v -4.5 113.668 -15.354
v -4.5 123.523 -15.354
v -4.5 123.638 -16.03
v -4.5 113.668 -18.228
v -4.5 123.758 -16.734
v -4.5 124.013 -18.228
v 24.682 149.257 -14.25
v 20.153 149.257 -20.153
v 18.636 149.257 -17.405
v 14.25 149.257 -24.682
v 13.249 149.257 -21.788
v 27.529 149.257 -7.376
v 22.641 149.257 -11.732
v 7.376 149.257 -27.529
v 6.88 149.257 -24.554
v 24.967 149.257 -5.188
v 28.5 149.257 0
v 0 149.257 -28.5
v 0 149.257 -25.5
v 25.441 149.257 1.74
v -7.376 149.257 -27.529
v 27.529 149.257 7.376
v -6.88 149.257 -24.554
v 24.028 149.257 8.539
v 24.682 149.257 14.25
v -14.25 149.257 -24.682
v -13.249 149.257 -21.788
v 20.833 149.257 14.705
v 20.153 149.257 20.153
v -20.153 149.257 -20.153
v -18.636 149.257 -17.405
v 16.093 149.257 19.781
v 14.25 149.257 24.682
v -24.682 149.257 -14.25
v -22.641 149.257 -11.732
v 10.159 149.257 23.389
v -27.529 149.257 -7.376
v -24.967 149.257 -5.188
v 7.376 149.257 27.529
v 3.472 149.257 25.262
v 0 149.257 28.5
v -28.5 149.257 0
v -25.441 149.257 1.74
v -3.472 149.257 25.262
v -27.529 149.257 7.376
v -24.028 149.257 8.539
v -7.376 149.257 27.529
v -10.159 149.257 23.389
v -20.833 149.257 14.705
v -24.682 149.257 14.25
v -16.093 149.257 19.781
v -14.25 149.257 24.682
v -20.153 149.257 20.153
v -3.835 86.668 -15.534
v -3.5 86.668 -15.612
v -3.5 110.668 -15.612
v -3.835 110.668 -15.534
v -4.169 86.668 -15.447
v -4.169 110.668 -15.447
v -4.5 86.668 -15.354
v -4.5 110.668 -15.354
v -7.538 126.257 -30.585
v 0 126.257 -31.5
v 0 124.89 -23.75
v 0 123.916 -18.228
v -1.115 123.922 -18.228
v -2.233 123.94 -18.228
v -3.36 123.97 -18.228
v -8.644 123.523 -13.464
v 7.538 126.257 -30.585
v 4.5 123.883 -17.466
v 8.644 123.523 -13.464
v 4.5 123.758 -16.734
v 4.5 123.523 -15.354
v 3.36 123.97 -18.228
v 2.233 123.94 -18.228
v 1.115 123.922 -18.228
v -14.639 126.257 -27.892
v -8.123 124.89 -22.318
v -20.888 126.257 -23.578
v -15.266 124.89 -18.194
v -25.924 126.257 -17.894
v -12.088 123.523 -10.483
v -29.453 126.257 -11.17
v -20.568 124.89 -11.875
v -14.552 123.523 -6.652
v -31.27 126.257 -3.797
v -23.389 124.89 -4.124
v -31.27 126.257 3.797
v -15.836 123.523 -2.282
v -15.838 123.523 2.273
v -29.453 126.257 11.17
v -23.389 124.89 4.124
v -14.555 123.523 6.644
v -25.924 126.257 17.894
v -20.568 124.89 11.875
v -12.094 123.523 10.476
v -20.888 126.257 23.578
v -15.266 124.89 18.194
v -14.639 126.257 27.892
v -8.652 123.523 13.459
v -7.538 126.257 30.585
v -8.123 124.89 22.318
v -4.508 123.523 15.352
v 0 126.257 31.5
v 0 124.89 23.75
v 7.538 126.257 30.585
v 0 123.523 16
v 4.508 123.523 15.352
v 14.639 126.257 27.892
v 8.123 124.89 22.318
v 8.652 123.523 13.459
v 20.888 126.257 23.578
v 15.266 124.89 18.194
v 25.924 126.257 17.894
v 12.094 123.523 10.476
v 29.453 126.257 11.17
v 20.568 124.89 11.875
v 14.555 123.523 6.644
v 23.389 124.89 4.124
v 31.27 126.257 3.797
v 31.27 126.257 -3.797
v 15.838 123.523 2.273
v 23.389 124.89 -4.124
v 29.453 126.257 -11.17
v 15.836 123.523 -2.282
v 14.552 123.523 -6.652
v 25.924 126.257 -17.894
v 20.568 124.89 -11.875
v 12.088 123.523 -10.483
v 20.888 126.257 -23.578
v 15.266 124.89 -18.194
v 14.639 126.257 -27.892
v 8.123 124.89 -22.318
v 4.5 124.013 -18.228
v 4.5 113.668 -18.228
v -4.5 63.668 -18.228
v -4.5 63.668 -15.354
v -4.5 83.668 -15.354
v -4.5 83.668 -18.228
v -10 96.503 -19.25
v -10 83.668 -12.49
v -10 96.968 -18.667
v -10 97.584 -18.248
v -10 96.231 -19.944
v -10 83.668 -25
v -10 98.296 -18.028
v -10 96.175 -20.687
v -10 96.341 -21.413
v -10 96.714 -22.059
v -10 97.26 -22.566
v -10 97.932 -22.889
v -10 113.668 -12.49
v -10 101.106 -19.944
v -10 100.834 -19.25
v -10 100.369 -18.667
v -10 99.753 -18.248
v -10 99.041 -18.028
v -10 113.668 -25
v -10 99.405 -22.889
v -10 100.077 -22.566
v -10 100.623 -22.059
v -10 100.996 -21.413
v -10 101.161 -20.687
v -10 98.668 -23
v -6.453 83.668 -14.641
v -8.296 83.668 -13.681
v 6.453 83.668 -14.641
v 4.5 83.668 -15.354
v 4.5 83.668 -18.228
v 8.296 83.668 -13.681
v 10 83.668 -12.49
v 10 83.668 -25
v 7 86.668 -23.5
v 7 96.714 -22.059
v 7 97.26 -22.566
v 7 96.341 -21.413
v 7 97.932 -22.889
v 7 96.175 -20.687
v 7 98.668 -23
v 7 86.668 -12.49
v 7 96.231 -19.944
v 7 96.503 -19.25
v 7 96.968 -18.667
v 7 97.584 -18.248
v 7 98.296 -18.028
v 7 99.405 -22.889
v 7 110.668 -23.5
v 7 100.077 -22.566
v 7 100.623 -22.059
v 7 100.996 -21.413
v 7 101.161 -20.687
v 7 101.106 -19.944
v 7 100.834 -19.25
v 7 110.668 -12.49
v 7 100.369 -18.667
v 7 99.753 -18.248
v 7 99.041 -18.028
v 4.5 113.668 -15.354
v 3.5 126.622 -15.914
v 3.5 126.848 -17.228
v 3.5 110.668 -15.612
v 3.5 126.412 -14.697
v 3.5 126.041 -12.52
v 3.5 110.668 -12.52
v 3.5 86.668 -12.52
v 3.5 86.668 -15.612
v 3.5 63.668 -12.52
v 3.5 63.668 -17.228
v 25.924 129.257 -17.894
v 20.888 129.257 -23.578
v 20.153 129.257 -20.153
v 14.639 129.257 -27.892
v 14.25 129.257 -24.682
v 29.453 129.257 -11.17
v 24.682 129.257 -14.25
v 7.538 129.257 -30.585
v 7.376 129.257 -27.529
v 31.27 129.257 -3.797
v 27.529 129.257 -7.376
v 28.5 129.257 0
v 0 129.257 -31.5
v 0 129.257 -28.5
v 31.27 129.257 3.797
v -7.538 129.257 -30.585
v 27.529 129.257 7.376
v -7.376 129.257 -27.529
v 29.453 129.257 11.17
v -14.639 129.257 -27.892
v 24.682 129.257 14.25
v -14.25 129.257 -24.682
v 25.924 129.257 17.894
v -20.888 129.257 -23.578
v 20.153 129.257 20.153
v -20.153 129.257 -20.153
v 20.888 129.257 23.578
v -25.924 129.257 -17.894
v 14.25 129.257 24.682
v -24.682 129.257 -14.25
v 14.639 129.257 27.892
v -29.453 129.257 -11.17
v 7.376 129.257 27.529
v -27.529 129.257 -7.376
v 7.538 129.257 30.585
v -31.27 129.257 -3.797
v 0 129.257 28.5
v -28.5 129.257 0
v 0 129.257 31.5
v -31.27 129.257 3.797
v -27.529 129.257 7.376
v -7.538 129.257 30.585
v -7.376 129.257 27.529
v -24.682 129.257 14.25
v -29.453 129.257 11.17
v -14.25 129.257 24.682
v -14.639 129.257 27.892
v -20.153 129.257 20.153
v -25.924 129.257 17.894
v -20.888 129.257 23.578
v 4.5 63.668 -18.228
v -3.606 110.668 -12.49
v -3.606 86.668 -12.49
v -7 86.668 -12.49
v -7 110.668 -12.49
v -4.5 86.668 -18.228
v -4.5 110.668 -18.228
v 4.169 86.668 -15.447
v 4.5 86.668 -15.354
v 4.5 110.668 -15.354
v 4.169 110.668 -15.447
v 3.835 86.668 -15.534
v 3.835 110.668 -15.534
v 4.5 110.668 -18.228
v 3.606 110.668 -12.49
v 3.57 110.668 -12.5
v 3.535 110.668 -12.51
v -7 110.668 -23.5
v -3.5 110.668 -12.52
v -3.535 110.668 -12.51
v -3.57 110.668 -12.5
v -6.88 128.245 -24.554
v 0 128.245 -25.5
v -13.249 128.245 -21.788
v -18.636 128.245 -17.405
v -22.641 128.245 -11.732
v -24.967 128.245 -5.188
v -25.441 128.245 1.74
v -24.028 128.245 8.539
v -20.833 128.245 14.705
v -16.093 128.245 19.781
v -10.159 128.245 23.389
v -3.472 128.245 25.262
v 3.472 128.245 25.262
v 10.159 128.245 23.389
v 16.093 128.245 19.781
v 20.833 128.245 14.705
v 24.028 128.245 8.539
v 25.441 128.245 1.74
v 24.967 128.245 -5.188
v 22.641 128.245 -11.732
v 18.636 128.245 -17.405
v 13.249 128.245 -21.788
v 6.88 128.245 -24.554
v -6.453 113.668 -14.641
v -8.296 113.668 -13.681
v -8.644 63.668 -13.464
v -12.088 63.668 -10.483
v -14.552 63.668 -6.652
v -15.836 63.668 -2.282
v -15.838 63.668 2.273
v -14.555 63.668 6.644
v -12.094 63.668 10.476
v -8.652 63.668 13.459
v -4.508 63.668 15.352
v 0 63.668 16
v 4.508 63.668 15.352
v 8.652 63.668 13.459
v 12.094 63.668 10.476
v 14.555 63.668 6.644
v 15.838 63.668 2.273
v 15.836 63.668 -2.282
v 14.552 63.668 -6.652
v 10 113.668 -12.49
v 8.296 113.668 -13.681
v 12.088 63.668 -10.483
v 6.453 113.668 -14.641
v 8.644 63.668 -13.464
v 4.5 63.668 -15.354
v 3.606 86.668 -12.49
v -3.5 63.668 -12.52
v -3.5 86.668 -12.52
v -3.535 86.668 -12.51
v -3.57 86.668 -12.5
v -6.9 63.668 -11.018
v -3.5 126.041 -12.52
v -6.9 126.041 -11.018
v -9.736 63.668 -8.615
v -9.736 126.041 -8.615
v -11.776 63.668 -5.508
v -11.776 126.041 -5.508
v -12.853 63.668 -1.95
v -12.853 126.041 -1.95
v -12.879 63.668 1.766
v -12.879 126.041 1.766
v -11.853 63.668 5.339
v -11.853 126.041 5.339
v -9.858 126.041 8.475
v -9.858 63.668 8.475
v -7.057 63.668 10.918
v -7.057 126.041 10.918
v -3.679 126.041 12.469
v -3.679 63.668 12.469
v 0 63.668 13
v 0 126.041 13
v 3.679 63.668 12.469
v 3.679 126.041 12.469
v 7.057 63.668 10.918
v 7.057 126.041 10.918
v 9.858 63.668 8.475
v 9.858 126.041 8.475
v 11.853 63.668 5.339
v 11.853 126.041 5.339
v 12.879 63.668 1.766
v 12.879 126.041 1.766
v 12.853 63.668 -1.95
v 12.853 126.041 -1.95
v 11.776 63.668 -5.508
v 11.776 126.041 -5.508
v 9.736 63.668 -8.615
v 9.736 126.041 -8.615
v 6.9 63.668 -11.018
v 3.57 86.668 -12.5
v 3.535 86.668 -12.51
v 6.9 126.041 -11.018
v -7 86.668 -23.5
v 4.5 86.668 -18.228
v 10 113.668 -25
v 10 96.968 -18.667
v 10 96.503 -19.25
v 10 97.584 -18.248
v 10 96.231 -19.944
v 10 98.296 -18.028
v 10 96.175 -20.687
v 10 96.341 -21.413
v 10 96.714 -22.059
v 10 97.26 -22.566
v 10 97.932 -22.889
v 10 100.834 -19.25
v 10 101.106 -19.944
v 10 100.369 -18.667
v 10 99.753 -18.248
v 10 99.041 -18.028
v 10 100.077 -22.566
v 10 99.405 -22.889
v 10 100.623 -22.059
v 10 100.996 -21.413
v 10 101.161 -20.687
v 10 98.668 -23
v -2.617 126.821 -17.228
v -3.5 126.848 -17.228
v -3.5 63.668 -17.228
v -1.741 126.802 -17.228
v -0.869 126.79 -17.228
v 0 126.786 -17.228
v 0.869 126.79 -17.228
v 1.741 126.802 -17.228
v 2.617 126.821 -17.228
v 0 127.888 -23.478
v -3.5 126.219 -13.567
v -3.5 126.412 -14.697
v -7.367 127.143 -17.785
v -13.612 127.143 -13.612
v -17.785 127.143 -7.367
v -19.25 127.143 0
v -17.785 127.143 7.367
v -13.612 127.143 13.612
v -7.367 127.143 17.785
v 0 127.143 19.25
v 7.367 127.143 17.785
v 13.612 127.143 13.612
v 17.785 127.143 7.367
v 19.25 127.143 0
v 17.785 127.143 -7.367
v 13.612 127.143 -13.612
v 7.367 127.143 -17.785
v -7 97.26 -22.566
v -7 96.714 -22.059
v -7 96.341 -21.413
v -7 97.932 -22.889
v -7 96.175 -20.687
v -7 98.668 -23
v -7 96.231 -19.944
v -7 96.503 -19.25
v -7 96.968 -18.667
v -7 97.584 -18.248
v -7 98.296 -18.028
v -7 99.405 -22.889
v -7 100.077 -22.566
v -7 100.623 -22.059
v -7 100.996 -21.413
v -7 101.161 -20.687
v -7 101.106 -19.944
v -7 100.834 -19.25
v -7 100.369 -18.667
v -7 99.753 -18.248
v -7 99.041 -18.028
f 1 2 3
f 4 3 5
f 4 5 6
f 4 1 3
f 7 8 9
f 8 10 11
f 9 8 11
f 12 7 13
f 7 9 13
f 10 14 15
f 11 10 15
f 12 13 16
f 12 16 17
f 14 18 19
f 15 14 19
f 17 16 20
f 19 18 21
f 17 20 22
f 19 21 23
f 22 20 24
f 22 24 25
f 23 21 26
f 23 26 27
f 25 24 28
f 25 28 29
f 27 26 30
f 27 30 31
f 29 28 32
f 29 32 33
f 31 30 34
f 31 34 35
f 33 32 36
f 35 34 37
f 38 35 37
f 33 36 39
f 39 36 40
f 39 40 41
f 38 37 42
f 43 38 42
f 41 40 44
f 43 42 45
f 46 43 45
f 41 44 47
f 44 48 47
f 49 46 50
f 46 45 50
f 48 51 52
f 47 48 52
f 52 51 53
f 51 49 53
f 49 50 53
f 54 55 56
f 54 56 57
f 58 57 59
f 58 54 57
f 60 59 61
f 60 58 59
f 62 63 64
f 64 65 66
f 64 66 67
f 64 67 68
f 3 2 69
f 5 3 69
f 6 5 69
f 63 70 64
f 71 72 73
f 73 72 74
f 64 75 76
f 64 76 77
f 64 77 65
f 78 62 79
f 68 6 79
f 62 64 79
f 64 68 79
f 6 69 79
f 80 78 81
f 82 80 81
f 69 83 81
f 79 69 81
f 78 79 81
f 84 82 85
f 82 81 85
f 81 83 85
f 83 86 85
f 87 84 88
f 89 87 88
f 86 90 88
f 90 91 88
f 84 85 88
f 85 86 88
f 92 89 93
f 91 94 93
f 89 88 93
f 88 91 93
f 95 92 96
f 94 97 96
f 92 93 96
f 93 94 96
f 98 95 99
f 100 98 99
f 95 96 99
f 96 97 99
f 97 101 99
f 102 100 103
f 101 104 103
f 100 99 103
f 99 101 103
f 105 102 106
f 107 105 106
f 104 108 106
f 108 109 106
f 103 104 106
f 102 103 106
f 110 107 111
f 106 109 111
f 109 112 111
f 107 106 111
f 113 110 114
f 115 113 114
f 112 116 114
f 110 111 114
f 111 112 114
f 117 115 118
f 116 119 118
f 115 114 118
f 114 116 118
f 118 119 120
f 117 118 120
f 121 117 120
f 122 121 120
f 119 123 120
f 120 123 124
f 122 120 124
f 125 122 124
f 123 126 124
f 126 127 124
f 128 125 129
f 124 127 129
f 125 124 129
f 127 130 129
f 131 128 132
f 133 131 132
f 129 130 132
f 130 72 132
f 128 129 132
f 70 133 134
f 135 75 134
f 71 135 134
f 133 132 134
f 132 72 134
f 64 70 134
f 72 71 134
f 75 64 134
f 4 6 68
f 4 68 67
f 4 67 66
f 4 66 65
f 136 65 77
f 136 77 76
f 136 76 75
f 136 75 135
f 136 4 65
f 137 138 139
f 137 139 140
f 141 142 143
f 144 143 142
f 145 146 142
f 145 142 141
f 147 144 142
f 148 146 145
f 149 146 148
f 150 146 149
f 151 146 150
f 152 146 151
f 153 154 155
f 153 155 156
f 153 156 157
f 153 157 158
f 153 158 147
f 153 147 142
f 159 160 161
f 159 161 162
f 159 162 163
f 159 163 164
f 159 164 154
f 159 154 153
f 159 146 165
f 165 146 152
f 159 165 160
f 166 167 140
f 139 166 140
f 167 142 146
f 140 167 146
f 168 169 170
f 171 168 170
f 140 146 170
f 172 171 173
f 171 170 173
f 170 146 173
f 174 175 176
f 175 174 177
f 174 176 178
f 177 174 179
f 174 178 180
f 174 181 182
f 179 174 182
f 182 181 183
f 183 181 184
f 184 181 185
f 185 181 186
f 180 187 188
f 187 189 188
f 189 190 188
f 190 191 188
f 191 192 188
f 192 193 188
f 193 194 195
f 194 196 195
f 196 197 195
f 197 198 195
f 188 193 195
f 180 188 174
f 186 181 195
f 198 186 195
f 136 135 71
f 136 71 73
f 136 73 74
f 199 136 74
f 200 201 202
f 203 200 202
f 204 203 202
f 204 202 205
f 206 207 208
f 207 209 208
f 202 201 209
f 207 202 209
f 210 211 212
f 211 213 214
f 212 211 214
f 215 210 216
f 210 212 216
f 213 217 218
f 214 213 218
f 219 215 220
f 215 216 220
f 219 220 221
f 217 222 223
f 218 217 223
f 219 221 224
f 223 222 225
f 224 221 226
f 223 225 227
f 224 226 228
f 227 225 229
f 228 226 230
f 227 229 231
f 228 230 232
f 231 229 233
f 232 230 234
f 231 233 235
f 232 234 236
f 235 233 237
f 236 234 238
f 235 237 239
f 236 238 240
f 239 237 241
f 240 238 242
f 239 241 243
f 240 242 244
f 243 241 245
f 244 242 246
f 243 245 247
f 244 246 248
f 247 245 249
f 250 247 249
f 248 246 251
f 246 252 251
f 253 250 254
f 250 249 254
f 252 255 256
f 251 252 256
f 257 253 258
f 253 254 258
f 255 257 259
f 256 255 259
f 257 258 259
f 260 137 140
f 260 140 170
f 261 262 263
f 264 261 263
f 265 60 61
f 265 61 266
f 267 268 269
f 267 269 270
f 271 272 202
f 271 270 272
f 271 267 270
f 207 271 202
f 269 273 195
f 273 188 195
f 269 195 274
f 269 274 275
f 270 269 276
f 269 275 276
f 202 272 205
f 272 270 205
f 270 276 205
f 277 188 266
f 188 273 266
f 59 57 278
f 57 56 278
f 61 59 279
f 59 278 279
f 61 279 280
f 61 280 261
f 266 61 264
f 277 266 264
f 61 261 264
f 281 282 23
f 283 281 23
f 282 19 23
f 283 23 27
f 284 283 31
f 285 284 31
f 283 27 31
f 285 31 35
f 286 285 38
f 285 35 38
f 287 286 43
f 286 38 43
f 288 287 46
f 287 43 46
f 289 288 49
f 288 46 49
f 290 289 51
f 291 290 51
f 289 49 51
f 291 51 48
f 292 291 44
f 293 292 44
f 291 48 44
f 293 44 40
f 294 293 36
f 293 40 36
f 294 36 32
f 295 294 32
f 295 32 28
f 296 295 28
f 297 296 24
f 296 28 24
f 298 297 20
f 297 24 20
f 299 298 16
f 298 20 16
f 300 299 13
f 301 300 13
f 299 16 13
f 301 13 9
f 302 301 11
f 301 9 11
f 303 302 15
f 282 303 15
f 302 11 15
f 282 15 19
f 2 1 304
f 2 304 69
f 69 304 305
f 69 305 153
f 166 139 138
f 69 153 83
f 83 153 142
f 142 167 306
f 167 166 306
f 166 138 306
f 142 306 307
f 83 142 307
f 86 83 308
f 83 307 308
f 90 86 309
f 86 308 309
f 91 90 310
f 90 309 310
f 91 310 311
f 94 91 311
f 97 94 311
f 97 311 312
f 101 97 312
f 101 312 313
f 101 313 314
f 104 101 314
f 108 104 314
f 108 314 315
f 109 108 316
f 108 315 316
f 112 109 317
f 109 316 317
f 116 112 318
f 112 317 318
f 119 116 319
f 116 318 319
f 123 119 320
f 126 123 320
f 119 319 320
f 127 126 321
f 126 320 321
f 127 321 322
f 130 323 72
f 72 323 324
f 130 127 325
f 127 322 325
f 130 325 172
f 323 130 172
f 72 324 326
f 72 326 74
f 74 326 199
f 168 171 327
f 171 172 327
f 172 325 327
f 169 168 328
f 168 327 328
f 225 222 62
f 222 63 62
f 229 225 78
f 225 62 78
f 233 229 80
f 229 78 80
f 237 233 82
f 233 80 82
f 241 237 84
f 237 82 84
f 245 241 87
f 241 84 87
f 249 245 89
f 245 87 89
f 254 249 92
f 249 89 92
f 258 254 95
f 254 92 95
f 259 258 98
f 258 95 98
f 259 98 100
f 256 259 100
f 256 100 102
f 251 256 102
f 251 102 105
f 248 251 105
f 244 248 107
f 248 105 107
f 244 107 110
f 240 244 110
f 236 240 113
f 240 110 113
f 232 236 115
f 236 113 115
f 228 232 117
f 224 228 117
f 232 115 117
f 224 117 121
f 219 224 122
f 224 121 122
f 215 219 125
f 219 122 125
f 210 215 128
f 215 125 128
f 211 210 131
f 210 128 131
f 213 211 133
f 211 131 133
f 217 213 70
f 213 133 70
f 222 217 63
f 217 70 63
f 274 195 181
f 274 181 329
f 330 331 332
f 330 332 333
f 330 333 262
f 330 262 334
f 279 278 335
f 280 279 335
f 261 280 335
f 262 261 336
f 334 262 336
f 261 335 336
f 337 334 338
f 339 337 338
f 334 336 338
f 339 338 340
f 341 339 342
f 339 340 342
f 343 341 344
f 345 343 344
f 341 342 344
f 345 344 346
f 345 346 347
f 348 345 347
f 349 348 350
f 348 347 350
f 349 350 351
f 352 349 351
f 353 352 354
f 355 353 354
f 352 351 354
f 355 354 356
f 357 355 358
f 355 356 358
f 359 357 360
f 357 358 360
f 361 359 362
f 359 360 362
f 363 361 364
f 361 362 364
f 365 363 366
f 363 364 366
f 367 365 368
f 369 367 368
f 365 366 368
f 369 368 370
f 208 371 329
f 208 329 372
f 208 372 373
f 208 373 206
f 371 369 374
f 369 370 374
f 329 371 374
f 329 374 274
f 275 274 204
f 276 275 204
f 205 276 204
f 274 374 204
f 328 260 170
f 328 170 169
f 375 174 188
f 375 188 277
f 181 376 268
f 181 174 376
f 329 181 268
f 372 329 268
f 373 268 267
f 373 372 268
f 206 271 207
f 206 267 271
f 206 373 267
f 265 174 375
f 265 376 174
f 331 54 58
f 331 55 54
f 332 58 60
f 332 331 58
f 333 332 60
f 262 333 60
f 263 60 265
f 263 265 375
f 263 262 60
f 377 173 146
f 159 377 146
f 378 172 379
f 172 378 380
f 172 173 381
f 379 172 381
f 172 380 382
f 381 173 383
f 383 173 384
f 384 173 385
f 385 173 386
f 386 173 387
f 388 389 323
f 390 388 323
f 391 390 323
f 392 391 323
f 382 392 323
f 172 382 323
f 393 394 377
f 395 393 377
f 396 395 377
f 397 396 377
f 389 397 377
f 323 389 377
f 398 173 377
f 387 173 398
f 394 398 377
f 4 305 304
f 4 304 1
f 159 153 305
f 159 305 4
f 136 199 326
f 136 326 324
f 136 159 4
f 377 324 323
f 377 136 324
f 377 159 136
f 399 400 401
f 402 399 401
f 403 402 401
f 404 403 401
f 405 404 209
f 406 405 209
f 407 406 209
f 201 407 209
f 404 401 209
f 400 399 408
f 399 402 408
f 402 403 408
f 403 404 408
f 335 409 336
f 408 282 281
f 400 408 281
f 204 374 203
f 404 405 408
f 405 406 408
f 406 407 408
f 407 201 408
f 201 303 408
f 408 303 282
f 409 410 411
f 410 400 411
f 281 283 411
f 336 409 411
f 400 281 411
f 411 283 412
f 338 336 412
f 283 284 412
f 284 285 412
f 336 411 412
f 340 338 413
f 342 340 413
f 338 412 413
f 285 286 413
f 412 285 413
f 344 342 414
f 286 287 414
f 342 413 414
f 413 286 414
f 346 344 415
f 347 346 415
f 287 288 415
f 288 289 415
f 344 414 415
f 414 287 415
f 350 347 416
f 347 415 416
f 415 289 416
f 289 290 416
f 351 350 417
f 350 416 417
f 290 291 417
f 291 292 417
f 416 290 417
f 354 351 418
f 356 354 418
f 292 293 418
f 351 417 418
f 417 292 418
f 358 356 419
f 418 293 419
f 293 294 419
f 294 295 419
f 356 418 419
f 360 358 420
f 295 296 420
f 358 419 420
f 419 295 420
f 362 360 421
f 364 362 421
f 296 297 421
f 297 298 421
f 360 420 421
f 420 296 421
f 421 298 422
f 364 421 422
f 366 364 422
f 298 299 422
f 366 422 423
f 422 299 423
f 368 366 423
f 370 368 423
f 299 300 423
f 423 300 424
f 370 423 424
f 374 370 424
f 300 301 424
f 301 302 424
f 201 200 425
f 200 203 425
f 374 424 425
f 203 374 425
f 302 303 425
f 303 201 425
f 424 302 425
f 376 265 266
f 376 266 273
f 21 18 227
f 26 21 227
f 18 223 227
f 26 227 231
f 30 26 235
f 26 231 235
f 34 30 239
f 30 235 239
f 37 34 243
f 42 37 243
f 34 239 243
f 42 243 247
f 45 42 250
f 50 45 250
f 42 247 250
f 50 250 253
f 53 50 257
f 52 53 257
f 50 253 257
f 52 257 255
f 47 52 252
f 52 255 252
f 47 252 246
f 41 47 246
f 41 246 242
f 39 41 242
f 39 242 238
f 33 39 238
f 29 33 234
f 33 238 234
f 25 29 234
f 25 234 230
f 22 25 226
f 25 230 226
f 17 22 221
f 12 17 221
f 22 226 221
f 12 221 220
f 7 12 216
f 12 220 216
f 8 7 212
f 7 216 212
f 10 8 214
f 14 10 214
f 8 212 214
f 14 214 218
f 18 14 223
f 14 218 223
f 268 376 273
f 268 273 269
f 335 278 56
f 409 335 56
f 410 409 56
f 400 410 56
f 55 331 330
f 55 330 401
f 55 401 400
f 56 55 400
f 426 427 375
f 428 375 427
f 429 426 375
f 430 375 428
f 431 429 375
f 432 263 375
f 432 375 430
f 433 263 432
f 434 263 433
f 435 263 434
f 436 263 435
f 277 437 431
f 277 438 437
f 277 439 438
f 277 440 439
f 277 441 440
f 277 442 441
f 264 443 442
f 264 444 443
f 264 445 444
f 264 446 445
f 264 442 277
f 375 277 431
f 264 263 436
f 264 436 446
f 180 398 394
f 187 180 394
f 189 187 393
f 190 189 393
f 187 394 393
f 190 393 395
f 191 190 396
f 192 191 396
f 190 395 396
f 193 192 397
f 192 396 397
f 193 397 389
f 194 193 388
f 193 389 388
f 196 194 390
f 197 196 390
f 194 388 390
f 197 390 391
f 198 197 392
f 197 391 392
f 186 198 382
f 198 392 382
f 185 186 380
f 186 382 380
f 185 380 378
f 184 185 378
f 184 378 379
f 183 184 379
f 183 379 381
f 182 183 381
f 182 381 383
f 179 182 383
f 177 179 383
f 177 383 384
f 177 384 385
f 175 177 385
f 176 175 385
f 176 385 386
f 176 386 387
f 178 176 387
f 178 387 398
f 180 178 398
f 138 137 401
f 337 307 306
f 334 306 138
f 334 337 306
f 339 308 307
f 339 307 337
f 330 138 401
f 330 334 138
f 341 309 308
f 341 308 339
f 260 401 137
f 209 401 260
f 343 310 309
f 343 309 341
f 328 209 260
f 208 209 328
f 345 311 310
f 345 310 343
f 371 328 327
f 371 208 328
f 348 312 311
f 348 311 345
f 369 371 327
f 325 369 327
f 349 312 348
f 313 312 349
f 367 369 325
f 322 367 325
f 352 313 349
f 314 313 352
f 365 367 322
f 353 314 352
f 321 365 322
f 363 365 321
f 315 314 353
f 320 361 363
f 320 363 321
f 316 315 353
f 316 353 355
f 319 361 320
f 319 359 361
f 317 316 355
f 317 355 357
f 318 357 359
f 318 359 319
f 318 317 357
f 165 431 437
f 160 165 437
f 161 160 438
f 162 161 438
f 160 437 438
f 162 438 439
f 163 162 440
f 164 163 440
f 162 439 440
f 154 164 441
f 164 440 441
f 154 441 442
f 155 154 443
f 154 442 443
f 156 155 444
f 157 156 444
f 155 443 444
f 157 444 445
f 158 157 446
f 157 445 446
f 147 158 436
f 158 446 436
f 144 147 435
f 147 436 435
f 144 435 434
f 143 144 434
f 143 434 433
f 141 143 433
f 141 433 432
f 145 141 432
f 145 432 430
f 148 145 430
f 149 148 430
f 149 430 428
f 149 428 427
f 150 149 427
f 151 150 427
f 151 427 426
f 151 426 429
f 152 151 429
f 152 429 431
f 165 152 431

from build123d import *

# Parameters (mm, degrees)
CROQUIS2_W              = 20
CROQUIS2_H              = 9
SALIENTE_EXTRUIR1_DEPTH = 30
CROQUIS3_R              = 2.5
CORTAR_EXTRUIR1_DEPTH   = 30
SALIENTE_EXTRUIR2_REACH = 161.769
CROQUIS4_W              = 20
CROQUIS4_H              = 30
CROQUIS5_W              = 14
CROQUIS5_H              = 24
CORTAR_EXTRUIR2_DEPTH   = 11.010004003
SALIENTE_EXTRUIR3_REACH = 98.487
CORTAR_EXTRUIR3_REACH   = 98.487


with BuildPart() as part:
    # Croquis1 → Revolución1 (revolve)
    with BuildSketch(Plane(origin=(0, 0, 0), x_dir=(0, 0, -1), z_dir=(1, 0, 0))):
        Polygon((28.5, 149.256566287), (28.5, 129.256566287), (31.5, 129.256566287), (31.5, 126.256566287), (16, 123.523498086), (16, 63.6684817), (13, 63.6684817), (13, 126.040796979), (25.5, 128.244884238), (25.5, 149.256566287), align=None)
    revolve(axis=Axis((0, 0, 0), (0, 1, 0)))

    # Croquis4 → Saliente-Extruir2 (add, up to next)
    with BuildSketch(Plane.XY.offset(-16), mode=Mode.PRIVATE) as saliente_extruir2_sk1:
        with Locations((0, 98.6684817)):
            Rectangle(CROQUIS4_W, CROQUIS4_H)
    saliente_extruir2_tool1 = extrude(saliente_extruir2_sk1.sketch, amount=SALIENTE_EXTRUIR2_REACH, mode=Mode.PRIVATE) - part.part


with BuildPart() as body_2:
    # Croquis2 → Saliente-Extruir1 (new body)
    with BuildSketch(Plane(origin=(0, 83.6684817, 0), x_dir=(-1, 0, 0), z_dir=(0, -1, 0))):
        with Locations((0, 20.5)):
            Rectangle(CROQUIS2_W, CROQUIS2_H)
    extrude(amount=-SALIENTE_EXTRUIR1_DEPTH)

    # Croquis3 → Cortar-Extruir1 (cut)
    with BuildSketch(Plane(origin=(10, 0, 0), x_dir=(0, 0, -1), z_dir=(1, 0, 0))):
        with Locations((20.5, 98.6684817)):
            Circle(CROQUIS3_R)
    extrude(amount=-CORTAR_EXTRUIR1_DEPTH, mode=Mode.SUBTRACT)


with BuildPart() as part_1:
    add(part.part)

    add(body_2.part)  # Saliente-Extruir2 merges body 2
    add(saliente_extruir2_tool1.solids().sort_by_distance((0, 98.668482, -16))[0])
    add(saliente_extruir2_tool1.solids().sort_by_distance((0, 98.668482, -16))[1])

    # Croquis5 → Cortar-Extruir2 (cut)
    with BuildSketch(Plane(origin=(0, 0, -12.489995997), x_dir=(-1, 0, 0), z_dir=(0, 0, -1))):
        with Locations((0, 98.6684817)):
            Rectangle(CROQUIS5_W, CROQUIS5_H)
    extrude(amount=CORTAR_EXTRUIR2_DEPTH, mode=Mode.SUBTRACT)

    # Saliente-Extruir3: up to this cone (the profile starts outside it)
    saliente_extruir3_end = Plane(origin=(0, 63.668482, 0), z_dir=(0, 1, 0)).offset(57.033785394) * Cone(5.671e-06, 237.928508939, 41.953214606, align=(Align.CENTER, Align.CENTER, Align.MIN), mode=Mode.PRIVATE)
    # Croquis6 → Saliente-Extruir3 (add, up to the surface)
    with BuildSketch(Plane.XZ.offset(-63.6684817), mode=Mode.PRIVATE) as saliente_extruir3_sk1:
        with BuildLine():
            Line((0, -18.227740962), (0, -16))
            ThreePointArc((0, -16), (-2.273055155, -15.837715121), (-4.5, -15.354152533))
            Line((-4.5, -15.354152533), (-4.5, -18.227740962))
            Line((-4.5, -18.227740962), (0, -18.227740962))
        make_face()
    saliente_extruir3_tool1 = extrude(saliente_extruir3_sk1.sketch, amount=-SALIENTE_EXTRUIR3_REACH, mode=Mode.PRIVATE) - saliente_extruir3_end
    add(saliente_extruir3_tool1.solids().sort_by_distance((-2.348795, 63.668482, -16.999565))[0])
    # Croquis6 → Saliente-Extruir3 (add, up to the surface)
    with BuildSketch(Plane.XZ.offset(-63.6684817), mode=Mode.PRIVATE) as saliente_extruir3_sk2:
        with BuildLine():
            ThreePointArc((4.5, -15.354152533), (2.273055155, -15.837715121), (0, -16))
            Line((0, -16), (0, -18.227740962))
            Line((0, -18.227740962), (4.5, -18.227740962))
            Line((4.5, -18.227740962), (4.5, -15.354152533))
        make_face()
    saliente_extruir3_tool2 = extrude(saliente_extruir3_sk2.sketch, amount=-SALIENTE_EXTRUIR3_REACH, mode=Mode.PRIVATE) - saliente_extruir3_end
    add(saliente_extruir3_tool2.solids().sort_by_distance((2.348795, 63.668482, -16.999565))[0])

    # Cortar-Extruir3: up to this cone (the profile starts outside it)
    cortar_extruir3_end = Plane(origin=(0, 63.668482, 0), z_dir=(0, 1, 0)).offset(60.08006523) * Cone(5.671e-06, 220.65219749, 38.90693477, align=(Align.CENTER, Align.CENTER, Align.MIN), mode=Mode.PRIVATE)
    # Croquis7 → Cortar-Extruir3 (cut, up to the surface)
    with BuildSketch(Plane.XZ.offset(-63.6684817), mode=Mode.PRIVATE) as cortar_extruir3_sk1:
        with BuildLine():
            Line((3.5, -17.227740962), (3.5, -15.354152533))
            Line((3.5, -15.354152533), (3.5, -12.519984026))
            ThreePointArc((3.5, -12.519984026), (0, -13), (-3.5, -12.519984026))
            Line((-3.5, -12.519984026), (-3.5, -15.354152533))
            Line((-3.5, -15.354152533), (-3.5, -17.227740962))
            Line((-3.5, -17.227740962), (3.5, -17.227740962))
        make_face()
    cortar_extruir3_tool1 = extrude(cortar_extruir3_sk1.sketch, amount=-CORTAR_EXTRUIR3_REACH, mode=Mode.PRIVATE) - cortar_extruir3_end
    add(cortar_extruir3_tool1.solids().sort_by_distance((0, 63.668482, -15.032146))[0], mode=Mode.SUBTRACT)


solid = part_1.part
